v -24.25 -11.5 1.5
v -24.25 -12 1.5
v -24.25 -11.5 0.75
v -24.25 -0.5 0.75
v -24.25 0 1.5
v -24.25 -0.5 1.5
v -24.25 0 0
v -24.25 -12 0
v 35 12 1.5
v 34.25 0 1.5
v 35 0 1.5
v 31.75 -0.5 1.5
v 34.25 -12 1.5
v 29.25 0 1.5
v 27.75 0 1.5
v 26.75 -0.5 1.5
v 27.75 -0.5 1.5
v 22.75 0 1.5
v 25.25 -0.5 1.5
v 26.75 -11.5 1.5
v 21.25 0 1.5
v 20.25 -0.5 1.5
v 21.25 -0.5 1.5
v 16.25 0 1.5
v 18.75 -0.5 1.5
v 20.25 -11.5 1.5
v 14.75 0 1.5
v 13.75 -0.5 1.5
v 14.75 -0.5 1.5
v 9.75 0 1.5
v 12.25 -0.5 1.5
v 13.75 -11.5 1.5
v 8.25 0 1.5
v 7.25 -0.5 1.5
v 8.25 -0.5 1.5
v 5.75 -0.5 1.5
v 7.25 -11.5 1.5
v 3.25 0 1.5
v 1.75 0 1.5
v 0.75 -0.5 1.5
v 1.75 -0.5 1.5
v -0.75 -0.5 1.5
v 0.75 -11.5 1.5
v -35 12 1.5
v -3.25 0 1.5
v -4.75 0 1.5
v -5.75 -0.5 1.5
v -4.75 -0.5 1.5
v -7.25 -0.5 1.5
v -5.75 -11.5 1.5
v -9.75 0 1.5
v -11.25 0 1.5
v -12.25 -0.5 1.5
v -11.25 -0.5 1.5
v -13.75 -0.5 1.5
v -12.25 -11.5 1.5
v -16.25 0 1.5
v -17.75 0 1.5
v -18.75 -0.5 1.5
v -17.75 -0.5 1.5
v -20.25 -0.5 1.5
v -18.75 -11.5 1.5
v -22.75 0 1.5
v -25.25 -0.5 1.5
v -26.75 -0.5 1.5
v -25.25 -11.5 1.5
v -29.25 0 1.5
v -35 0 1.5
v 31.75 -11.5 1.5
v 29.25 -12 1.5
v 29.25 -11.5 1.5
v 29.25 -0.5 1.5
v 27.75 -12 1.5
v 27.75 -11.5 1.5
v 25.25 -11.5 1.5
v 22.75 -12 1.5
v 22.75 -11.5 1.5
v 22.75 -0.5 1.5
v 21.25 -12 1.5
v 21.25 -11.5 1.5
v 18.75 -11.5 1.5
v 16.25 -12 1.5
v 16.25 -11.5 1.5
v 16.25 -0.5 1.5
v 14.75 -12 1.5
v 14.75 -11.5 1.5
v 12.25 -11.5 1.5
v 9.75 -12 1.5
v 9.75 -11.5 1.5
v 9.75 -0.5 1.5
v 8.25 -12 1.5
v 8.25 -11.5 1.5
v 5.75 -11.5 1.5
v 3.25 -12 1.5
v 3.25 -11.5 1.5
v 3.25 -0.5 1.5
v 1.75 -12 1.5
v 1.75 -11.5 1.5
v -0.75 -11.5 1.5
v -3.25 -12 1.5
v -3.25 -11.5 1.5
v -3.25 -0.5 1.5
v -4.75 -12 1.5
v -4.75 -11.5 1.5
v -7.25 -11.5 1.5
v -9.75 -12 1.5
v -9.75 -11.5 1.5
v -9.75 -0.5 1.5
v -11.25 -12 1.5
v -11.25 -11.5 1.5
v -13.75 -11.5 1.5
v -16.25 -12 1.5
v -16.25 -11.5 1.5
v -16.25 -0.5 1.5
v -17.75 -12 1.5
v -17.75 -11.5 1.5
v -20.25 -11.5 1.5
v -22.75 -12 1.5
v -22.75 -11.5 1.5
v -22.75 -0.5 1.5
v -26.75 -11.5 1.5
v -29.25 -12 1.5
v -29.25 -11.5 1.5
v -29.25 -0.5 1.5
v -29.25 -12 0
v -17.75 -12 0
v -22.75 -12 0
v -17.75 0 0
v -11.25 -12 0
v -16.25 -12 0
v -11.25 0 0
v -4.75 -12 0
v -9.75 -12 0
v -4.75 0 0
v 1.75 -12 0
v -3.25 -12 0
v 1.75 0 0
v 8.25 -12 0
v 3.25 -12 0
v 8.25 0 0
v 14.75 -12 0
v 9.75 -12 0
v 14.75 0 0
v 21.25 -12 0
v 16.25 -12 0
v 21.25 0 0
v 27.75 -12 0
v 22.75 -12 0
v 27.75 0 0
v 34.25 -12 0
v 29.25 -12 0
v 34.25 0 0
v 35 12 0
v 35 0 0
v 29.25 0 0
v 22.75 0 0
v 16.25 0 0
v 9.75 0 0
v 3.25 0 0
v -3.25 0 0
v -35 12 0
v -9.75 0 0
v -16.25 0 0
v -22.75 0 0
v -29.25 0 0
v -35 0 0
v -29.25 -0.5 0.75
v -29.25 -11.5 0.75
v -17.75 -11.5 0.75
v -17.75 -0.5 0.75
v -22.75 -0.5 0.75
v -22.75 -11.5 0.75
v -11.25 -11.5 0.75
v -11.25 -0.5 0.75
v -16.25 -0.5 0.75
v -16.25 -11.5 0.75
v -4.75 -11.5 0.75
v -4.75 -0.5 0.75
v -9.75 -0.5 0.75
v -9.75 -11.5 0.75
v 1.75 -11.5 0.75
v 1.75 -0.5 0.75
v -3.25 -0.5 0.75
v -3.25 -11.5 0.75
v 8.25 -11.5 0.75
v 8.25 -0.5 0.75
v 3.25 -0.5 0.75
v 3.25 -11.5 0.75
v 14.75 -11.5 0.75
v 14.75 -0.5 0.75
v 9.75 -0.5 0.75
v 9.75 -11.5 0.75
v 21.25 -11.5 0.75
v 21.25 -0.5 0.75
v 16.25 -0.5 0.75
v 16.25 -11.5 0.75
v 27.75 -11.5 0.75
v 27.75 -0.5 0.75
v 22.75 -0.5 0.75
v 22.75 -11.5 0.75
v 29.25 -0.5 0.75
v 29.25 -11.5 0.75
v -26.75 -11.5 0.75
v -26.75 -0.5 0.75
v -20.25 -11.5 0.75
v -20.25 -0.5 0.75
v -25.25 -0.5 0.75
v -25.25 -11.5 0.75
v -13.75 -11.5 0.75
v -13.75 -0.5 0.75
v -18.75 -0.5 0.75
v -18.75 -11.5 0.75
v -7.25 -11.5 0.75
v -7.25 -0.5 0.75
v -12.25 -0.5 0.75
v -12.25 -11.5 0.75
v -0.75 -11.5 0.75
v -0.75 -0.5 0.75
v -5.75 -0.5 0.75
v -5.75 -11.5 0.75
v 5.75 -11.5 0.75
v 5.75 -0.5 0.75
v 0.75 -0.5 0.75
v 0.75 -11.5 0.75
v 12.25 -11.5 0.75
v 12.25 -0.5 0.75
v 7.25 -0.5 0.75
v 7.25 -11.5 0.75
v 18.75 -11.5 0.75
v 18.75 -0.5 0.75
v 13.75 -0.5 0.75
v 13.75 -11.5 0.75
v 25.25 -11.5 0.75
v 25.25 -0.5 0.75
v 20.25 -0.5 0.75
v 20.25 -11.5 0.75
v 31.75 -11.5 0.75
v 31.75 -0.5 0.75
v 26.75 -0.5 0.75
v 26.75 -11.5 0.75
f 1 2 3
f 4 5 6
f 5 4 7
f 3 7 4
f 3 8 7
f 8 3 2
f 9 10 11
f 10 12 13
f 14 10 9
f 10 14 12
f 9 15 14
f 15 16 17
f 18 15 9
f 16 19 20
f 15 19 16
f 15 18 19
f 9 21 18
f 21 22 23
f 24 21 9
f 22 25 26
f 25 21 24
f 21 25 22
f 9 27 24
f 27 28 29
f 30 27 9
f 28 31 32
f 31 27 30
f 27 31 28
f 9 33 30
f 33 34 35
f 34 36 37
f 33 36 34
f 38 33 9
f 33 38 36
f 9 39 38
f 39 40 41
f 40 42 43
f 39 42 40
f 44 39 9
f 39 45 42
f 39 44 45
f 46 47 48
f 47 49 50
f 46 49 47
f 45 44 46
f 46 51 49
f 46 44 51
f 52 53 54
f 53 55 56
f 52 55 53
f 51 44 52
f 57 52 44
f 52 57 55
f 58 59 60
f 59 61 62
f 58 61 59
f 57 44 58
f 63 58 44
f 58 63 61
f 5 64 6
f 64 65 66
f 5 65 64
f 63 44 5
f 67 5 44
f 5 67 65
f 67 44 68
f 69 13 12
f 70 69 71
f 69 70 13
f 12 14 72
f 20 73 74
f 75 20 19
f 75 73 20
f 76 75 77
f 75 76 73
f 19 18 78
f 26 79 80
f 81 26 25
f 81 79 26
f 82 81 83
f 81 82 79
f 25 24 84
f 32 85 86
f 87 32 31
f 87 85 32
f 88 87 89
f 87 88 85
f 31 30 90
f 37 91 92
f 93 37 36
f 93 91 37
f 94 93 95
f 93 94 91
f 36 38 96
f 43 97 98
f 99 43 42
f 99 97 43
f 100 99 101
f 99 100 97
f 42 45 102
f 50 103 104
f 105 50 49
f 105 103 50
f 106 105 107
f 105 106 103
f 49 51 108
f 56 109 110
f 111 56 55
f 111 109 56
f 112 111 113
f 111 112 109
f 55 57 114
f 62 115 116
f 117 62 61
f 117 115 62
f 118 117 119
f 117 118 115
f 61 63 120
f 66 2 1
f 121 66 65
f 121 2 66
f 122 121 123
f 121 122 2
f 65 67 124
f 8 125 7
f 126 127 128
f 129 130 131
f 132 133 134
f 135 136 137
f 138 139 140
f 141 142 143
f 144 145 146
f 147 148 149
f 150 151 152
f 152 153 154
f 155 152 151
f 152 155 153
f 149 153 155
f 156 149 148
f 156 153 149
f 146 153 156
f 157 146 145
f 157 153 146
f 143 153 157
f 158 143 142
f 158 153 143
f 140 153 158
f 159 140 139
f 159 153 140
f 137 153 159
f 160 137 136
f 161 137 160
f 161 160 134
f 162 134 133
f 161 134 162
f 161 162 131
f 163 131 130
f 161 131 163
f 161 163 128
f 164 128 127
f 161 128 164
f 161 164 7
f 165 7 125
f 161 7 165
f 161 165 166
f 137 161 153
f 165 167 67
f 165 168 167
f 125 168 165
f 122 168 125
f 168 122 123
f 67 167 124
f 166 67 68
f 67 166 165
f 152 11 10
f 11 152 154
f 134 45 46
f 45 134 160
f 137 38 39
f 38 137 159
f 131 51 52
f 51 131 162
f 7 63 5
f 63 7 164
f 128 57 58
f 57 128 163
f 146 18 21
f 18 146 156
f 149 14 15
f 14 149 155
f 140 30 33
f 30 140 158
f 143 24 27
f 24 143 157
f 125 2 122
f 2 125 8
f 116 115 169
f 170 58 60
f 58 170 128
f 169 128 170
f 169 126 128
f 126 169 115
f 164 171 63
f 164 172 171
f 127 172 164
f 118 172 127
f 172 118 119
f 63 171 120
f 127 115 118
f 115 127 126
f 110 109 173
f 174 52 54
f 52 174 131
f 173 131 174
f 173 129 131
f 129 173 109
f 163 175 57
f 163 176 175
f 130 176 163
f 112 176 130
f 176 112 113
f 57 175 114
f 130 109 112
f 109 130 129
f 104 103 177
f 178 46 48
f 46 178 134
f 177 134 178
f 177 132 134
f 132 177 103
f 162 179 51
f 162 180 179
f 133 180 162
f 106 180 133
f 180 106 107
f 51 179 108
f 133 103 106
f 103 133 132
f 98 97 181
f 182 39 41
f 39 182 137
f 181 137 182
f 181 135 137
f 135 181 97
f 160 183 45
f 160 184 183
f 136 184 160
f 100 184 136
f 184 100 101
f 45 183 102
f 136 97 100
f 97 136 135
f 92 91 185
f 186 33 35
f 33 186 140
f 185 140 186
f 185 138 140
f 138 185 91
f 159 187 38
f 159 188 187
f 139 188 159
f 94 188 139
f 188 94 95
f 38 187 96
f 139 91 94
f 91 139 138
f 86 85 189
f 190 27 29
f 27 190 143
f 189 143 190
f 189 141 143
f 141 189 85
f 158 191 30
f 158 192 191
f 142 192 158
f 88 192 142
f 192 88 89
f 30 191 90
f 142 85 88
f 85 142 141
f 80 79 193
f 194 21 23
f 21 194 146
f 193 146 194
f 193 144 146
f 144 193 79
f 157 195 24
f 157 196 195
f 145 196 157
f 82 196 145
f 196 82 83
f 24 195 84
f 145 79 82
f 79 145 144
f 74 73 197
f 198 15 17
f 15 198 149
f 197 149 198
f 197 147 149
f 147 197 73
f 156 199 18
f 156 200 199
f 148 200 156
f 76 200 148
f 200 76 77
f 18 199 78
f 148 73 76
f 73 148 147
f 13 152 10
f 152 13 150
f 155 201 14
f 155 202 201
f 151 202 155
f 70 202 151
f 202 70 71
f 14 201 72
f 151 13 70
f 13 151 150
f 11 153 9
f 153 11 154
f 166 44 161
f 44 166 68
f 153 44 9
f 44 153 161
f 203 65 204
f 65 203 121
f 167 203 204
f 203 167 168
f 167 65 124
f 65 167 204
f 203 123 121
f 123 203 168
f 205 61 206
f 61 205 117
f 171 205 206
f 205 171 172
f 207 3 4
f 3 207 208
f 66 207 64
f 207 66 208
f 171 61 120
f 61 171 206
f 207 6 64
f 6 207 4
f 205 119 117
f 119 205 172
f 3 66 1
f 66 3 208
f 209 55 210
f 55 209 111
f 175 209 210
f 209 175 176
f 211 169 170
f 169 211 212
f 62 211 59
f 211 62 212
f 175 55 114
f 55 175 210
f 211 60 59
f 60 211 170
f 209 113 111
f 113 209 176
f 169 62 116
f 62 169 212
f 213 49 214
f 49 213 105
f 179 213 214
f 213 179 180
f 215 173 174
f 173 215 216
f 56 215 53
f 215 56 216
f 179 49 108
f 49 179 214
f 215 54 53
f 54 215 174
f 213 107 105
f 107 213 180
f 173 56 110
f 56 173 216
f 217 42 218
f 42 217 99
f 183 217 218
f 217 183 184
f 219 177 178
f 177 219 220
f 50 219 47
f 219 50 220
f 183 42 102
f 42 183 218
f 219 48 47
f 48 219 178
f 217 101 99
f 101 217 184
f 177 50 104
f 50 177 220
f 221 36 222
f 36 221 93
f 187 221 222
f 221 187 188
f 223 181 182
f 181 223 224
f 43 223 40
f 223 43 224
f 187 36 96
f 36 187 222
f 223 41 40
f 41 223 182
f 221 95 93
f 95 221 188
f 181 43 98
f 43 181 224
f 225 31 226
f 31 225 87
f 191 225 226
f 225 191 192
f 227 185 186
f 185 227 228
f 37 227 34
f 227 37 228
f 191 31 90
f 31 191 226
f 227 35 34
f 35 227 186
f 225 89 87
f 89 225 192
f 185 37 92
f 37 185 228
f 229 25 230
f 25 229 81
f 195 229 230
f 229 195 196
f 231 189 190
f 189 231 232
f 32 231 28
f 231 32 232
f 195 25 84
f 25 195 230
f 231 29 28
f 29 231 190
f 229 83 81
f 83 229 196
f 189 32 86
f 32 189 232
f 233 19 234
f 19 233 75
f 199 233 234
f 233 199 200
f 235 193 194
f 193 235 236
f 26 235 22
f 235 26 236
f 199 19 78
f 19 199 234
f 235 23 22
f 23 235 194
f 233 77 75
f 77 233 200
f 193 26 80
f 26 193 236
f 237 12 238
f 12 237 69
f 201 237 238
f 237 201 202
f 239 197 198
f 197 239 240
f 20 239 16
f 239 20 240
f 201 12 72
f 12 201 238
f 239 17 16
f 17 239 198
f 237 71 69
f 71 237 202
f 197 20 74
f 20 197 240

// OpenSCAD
// 10-well comb for agarose gel casting, printed lying flat
// Units: mm

plate_t      = 1.5;   // plate thickness (Z)
spine_len    = 70;    // spine length (X)
spine_w      = 12;    // spine width (Y)
tooth_count  = 10;    // number of teeth
tooth_w      = 5.0;   // tooth width (X)
tooth_len    = 12;    // tooth length (Y)
gap          = 1.5;   // gap between teeth (X)
eps          = 0.5;   // cutter overshoot

$fn = 64;

pitch = tooth_w + gap;
x0   = -(tooth_count - 1) * pitch / 2;   // first tooth left edge

difference() {
    union() {
        // spine
        translate([-spine_len / 2, 0, 0])
            cube([spine_len, spine_w, plate_t]);
        // teeth
        for (i = [0 : tooth_count - 1])
            translate([x0 + i * pitch, -tooth_len, 0])
                cube([tooth_w, tooth_len, plate_t]);
    }
    // wells
    for (i = [0 : tooth_count - 1])
        translate([x0 + i * pitch - tooth_w / 2, -tooth_len + eps, plate_t / 2])
            cube([tooth_w, tooth_len - 2 * eps, plate_t]);
}
